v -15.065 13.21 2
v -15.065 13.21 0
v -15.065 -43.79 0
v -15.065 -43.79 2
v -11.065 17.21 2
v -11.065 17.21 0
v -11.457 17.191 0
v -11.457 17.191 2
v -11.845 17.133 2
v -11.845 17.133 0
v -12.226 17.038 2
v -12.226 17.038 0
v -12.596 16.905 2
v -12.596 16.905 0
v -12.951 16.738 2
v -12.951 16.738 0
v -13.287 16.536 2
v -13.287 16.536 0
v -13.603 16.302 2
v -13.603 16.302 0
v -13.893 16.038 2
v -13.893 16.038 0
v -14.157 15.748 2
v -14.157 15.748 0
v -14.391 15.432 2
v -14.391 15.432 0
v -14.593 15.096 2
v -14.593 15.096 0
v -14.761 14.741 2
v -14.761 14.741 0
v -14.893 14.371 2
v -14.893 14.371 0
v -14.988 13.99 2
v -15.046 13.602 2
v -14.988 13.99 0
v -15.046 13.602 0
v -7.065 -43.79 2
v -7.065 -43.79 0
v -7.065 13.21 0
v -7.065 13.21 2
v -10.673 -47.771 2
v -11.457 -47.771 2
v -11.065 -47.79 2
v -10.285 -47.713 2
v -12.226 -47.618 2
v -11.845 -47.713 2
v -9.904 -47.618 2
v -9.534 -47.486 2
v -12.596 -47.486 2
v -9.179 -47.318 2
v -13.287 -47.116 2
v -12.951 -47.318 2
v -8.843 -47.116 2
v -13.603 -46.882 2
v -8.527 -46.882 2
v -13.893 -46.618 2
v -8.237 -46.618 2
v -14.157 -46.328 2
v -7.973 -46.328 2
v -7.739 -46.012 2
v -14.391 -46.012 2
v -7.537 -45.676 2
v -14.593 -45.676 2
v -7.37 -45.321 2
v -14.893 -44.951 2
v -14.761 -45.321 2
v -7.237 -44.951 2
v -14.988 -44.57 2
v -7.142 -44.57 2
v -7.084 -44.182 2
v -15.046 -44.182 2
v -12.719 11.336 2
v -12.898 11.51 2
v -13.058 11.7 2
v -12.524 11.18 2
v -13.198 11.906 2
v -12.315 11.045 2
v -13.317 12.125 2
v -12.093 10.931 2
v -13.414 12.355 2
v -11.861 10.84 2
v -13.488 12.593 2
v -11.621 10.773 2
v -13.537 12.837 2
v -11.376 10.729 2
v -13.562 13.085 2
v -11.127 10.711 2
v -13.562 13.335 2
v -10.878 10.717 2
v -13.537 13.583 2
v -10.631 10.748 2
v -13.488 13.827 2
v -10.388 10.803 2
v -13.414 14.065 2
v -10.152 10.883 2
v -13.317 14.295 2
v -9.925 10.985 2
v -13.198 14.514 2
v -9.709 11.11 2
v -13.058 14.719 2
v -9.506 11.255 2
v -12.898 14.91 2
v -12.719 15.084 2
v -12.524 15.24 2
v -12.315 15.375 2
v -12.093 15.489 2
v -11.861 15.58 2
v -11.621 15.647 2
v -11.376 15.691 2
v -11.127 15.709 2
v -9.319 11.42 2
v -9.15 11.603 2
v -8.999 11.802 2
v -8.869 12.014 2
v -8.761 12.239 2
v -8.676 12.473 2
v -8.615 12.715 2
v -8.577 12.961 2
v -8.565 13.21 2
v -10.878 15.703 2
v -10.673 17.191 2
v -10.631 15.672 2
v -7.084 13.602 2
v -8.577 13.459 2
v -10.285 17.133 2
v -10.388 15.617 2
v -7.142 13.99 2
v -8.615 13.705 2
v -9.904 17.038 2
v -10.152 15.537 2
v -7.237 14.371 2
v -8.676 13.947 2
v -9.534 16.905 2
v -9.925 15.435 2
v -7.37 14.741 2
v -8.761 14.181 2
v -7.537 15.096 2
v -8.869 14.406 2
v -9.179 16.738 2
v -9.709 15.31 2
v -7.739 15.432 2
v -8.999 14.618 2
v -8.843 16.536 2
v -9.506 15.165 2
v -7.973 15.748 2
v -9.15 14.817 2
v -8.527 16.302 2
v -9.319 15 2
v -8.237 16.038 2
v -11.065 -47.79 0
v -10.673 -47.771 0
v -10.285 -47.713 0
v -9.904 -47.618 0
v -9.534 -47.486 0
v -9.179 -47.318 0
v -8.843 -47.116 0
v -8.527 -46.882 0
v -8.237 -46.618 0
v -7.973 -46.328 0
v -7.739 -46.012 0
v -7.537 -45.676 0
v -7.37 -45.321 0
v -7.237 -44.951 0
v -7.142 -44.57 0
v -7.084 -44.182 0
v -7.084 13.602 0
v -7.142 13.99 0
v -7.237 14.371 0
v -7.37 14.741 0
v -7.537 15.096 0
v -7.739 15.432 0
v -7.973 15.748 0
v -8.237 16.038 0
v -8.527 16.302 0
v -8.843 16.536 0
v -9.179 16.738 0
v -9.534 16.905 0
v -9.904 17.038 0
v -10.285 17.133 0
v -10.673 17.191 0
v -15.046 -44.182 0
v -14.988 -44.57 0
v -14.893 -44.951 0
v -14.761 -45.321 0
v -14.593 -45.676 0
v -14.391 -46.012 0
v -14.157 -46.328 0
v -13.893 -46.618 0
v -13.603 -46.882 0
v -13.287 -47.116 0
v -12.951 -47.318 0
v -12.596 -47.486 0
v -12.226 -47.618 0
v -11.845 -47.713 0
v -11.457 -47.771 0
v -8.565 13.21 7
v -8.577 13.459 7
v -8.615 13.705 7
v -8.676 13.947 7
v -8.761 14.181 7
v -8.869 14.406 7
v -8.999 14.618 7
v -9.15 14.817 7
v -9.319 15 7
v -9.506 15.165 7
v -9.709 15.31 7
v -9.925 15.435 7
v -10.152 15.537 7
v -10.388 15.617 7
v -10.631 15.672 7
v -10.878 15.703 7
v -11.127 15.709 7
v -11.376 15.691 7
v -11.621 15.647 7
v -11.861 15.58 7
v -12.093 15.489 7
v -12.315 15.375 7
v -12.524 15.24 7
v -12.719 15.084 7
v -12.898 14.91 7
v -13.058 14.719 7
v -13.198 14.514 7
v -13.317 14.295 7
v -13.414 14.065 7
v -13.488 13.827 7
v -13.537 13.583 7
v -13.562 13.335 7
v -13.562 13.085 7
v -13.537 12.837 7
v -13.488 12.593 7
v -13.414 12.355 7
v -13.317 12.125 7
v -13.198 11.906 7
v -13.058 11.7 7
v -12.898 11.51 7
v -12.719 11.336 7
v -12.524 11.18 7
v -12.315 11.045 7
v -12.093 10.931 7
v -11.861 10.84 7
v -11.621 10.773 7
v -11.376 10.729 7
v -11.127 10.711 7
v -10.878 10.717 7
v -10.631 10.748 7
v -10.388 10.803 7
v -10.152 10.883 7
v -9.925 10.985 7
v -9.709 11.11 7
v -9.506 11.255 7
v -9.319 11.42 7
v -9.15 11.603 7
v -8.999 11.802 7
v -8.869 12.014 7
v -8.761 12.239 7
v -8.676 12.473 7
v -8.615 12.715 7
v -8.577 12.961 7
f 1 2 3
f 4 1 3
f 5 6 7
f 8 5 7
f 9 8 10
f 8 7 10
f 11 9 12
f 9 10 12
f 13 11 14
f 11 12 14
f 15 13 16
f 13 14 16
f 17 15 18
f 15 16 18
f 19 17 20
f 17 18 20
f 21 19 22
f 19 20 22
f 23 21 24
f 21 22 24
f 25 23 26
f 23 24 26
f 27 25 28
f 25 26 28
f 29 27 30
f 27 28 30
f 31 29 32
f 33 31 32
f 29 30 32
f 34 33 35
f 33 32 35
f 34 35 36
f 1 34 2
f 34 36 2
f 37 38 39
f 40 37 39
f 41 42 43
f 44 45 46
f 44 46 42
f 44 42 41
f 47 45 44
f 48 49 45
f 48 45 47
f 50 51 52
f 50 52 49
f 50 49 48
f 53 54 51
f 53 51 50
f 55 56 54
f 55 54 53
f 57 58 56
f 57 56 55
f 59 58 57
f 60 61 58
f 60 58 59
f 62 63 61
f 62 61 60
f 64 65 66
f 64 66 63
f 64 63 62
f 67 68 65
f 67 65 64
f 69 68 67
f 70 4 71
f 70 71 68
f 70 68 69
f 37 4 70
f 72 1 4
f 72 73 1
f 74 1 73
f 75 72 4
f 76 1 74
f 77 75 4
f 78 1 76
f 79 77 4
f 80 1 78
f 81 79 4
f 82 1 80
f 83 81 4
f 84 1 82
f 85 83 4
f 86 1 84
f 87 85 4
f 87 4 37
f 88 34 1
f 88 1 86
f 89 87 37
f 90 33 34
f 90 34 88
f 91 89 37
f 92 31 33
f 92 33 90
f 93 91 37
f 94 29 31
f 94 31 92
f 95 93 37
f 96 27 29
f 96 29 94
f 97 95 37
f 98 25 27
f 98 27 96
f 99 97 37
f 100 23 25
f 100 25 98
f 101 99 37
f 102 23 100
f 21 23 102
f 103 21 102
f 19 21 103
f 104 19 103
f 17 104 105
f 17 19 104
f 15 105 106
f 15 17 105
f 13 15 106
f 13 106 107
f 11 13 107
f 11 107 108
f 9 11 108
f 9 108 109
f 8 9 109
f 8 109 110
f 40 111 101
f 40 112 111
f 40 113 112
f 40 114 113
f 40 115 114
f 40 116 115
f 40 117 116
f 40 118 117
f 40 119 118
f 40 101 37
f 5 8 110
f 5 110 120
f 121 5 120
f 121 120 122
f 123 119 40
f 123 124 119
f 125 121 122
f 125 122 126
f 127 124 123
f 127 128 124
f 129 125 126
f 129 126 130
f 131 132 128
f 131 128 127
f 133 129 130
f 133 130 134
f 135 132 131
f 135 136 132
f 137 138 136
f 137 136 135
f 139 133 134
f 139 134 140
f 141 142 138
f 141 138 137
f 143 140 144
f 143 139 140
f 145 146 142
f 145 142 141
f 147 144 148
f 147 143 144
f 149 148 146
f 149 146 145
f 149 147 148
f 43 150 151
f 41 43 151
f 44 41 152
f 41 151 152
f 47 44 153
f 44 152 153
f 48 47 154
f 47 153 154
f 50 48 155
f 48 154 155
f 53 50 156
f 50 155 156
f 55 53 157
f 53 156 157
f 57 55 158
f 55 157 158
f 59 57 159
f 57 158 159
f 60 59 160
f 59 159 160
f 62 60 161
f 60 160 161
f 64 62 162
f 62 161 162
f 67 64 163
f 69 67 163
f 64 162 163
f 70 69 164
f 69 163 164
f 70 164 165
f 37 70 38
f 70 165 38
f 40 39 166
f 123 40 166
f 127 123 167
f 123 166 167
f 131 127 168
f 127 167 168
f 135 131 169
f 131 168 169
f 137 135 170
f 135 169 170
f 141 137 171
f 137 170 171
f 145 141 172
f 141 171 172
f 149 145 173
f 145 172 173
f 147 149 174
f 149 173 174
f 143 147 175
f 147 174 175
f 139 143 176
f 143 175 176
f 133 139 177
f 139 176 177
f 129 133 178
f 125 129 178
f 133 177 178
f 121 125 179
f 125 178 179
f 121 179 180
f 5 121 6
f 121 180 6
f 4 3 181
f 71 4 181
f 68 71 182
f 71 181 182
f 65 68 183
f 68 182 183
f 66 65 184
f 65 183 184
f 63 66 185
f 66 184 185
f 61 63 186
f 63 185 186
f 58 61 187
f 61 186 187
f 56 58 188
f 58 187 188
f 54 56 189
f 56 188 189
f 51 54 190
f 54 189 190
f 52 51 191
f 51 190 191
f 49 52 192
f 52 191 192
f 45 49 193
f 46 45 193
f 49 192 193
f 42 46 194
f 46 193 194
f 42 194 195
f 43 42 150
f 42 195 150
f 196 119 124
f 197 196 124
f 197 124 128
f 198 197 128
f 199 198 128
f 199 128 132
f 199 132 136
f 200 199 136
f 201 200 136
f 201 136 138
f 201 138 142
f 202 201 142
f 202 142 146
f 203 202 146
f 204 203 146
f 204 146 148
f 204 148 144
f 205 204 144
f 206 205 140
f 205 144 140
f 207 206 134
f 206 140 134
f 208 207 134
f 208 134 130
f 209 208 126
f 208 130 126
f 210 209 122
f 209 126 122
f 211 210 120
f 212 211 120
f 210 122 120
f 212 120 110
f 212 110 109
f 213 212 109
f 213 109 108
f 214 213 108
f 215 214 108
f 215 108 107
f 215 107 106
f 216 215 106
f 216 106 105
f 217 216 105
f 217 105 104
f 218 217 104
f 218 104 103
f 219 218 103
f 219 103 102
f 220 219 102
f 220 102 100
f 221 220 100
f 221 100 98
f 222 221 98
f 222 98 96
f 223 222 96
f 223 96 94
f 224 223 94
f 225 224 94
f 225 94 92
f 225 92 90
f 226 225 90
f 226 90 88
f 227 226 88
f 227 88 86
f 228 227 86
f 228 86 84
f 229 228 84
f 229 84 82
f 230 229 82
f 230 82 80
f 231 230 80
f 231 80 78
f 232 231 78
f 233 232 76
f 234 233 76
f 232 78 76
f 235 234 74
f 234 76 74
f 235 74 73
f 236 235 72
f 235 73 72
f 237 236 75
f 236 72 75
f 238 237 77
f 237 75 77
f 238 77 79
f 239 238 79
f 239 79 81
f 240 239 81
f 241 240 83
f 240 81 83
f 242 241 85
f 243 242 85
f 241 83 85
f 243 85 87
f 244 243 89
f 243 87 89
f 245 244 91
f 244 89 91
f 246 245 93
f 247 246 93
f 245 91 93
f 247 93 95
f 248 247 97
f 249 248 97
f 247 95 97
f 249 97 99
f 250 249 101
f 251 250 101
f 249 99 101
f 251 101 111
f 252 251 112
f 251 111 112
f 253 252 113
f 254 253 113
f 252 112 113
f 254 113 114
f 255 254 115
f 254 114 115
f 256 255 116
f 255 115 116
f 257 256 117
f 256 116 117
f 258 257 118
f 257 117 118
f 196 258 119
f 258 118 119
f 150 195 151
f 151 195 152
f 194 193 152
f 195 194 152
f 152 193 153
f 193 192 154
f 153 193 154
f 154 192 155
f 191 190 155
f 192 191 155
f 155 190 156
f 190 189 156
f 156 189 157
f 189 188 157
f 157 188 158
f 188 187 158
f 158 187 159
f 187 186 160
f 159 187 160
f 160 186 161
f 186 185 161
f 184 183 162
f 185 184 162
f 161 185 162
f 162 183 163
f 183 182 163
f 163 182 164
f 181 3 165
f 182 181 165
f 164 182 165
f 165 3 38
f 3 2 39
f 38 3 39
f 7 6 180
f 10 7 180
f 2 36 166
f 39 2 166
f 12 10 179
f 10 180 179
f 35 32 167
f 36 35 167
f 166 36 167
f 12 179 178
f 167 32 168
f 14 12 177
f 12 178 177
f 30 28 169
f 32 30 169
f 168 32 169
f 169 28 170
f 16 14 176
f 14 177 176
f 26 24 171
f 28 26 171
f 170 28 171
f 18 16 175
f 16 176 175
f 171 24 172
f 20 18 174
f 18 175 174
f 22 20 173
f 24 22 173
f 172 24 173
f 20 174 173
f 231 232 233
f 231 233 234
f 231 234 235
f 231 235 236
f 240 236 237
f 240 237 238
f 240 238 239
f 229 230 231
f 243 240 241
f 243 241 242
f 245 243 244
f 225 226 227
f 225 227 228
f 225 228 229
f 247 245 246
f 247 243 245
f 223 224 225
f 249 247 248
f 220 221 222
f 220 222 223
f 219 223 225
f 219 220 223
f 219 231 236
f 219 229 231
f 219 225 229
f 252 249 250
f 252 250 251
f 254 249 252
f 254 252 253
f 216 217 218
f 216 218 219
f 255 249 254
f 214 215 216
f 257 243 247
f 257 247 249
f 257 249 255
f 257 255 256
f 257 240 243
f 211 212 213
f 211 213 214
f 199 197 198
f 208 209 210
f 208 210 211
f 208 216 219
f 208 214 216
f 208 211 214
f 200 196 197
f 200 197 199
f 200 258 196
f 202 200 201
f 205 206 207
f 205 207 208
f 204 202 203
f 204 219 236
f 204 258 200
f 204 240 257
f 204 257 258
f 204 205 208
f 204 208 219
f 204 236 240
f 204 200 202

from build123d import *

# Parameters (mm, degrees)
F1_R     = 2.5
F2_DEPTH = 7
F3_DEPTH = 2


with BuildPart() as f2:
    # F1 (on offset) → F2 (new body)
    with BuildSketch(Plane.XY):
        with Locations((-11.065031, 13.209959)):
            Circle(F1_R)
    extrude(amount=F2_DEPTH)

    # F1 (on offset) → F3 (join)
    with BuildSketch(Plane.XY):
        with BuildLine():
            ThreePointArc((-11.065031, 17.209959), (-13.893458, 16.038386), (-15.065031, 13.209959))
            Line((-15.065031, 13.209959), (-15.065031, -43.790041))
            ThreePointArc((-15.065031, -43.790041), (-13.893458, -46.618468), (-11.065031, -47.790041))
            ThreePointArc((-11.065031, -47.790041), (-8.236604, -46.618468), (-7.065031, -43.790041))
            Line((-7.065031, -43.790041), (-7.065031, 13.209959))
            ThreePointArc((-7.065031, 13.209959), (-8.236604, 16.038386), (-11.065031, 17.209959))
        make_face()
        with Locations((-11.065031, 13.209959)):
            Circle(F1_R, mode=Mode.SUBTRACT)
    extrude(amount=F3_DEPTH)


solid = f2.part
